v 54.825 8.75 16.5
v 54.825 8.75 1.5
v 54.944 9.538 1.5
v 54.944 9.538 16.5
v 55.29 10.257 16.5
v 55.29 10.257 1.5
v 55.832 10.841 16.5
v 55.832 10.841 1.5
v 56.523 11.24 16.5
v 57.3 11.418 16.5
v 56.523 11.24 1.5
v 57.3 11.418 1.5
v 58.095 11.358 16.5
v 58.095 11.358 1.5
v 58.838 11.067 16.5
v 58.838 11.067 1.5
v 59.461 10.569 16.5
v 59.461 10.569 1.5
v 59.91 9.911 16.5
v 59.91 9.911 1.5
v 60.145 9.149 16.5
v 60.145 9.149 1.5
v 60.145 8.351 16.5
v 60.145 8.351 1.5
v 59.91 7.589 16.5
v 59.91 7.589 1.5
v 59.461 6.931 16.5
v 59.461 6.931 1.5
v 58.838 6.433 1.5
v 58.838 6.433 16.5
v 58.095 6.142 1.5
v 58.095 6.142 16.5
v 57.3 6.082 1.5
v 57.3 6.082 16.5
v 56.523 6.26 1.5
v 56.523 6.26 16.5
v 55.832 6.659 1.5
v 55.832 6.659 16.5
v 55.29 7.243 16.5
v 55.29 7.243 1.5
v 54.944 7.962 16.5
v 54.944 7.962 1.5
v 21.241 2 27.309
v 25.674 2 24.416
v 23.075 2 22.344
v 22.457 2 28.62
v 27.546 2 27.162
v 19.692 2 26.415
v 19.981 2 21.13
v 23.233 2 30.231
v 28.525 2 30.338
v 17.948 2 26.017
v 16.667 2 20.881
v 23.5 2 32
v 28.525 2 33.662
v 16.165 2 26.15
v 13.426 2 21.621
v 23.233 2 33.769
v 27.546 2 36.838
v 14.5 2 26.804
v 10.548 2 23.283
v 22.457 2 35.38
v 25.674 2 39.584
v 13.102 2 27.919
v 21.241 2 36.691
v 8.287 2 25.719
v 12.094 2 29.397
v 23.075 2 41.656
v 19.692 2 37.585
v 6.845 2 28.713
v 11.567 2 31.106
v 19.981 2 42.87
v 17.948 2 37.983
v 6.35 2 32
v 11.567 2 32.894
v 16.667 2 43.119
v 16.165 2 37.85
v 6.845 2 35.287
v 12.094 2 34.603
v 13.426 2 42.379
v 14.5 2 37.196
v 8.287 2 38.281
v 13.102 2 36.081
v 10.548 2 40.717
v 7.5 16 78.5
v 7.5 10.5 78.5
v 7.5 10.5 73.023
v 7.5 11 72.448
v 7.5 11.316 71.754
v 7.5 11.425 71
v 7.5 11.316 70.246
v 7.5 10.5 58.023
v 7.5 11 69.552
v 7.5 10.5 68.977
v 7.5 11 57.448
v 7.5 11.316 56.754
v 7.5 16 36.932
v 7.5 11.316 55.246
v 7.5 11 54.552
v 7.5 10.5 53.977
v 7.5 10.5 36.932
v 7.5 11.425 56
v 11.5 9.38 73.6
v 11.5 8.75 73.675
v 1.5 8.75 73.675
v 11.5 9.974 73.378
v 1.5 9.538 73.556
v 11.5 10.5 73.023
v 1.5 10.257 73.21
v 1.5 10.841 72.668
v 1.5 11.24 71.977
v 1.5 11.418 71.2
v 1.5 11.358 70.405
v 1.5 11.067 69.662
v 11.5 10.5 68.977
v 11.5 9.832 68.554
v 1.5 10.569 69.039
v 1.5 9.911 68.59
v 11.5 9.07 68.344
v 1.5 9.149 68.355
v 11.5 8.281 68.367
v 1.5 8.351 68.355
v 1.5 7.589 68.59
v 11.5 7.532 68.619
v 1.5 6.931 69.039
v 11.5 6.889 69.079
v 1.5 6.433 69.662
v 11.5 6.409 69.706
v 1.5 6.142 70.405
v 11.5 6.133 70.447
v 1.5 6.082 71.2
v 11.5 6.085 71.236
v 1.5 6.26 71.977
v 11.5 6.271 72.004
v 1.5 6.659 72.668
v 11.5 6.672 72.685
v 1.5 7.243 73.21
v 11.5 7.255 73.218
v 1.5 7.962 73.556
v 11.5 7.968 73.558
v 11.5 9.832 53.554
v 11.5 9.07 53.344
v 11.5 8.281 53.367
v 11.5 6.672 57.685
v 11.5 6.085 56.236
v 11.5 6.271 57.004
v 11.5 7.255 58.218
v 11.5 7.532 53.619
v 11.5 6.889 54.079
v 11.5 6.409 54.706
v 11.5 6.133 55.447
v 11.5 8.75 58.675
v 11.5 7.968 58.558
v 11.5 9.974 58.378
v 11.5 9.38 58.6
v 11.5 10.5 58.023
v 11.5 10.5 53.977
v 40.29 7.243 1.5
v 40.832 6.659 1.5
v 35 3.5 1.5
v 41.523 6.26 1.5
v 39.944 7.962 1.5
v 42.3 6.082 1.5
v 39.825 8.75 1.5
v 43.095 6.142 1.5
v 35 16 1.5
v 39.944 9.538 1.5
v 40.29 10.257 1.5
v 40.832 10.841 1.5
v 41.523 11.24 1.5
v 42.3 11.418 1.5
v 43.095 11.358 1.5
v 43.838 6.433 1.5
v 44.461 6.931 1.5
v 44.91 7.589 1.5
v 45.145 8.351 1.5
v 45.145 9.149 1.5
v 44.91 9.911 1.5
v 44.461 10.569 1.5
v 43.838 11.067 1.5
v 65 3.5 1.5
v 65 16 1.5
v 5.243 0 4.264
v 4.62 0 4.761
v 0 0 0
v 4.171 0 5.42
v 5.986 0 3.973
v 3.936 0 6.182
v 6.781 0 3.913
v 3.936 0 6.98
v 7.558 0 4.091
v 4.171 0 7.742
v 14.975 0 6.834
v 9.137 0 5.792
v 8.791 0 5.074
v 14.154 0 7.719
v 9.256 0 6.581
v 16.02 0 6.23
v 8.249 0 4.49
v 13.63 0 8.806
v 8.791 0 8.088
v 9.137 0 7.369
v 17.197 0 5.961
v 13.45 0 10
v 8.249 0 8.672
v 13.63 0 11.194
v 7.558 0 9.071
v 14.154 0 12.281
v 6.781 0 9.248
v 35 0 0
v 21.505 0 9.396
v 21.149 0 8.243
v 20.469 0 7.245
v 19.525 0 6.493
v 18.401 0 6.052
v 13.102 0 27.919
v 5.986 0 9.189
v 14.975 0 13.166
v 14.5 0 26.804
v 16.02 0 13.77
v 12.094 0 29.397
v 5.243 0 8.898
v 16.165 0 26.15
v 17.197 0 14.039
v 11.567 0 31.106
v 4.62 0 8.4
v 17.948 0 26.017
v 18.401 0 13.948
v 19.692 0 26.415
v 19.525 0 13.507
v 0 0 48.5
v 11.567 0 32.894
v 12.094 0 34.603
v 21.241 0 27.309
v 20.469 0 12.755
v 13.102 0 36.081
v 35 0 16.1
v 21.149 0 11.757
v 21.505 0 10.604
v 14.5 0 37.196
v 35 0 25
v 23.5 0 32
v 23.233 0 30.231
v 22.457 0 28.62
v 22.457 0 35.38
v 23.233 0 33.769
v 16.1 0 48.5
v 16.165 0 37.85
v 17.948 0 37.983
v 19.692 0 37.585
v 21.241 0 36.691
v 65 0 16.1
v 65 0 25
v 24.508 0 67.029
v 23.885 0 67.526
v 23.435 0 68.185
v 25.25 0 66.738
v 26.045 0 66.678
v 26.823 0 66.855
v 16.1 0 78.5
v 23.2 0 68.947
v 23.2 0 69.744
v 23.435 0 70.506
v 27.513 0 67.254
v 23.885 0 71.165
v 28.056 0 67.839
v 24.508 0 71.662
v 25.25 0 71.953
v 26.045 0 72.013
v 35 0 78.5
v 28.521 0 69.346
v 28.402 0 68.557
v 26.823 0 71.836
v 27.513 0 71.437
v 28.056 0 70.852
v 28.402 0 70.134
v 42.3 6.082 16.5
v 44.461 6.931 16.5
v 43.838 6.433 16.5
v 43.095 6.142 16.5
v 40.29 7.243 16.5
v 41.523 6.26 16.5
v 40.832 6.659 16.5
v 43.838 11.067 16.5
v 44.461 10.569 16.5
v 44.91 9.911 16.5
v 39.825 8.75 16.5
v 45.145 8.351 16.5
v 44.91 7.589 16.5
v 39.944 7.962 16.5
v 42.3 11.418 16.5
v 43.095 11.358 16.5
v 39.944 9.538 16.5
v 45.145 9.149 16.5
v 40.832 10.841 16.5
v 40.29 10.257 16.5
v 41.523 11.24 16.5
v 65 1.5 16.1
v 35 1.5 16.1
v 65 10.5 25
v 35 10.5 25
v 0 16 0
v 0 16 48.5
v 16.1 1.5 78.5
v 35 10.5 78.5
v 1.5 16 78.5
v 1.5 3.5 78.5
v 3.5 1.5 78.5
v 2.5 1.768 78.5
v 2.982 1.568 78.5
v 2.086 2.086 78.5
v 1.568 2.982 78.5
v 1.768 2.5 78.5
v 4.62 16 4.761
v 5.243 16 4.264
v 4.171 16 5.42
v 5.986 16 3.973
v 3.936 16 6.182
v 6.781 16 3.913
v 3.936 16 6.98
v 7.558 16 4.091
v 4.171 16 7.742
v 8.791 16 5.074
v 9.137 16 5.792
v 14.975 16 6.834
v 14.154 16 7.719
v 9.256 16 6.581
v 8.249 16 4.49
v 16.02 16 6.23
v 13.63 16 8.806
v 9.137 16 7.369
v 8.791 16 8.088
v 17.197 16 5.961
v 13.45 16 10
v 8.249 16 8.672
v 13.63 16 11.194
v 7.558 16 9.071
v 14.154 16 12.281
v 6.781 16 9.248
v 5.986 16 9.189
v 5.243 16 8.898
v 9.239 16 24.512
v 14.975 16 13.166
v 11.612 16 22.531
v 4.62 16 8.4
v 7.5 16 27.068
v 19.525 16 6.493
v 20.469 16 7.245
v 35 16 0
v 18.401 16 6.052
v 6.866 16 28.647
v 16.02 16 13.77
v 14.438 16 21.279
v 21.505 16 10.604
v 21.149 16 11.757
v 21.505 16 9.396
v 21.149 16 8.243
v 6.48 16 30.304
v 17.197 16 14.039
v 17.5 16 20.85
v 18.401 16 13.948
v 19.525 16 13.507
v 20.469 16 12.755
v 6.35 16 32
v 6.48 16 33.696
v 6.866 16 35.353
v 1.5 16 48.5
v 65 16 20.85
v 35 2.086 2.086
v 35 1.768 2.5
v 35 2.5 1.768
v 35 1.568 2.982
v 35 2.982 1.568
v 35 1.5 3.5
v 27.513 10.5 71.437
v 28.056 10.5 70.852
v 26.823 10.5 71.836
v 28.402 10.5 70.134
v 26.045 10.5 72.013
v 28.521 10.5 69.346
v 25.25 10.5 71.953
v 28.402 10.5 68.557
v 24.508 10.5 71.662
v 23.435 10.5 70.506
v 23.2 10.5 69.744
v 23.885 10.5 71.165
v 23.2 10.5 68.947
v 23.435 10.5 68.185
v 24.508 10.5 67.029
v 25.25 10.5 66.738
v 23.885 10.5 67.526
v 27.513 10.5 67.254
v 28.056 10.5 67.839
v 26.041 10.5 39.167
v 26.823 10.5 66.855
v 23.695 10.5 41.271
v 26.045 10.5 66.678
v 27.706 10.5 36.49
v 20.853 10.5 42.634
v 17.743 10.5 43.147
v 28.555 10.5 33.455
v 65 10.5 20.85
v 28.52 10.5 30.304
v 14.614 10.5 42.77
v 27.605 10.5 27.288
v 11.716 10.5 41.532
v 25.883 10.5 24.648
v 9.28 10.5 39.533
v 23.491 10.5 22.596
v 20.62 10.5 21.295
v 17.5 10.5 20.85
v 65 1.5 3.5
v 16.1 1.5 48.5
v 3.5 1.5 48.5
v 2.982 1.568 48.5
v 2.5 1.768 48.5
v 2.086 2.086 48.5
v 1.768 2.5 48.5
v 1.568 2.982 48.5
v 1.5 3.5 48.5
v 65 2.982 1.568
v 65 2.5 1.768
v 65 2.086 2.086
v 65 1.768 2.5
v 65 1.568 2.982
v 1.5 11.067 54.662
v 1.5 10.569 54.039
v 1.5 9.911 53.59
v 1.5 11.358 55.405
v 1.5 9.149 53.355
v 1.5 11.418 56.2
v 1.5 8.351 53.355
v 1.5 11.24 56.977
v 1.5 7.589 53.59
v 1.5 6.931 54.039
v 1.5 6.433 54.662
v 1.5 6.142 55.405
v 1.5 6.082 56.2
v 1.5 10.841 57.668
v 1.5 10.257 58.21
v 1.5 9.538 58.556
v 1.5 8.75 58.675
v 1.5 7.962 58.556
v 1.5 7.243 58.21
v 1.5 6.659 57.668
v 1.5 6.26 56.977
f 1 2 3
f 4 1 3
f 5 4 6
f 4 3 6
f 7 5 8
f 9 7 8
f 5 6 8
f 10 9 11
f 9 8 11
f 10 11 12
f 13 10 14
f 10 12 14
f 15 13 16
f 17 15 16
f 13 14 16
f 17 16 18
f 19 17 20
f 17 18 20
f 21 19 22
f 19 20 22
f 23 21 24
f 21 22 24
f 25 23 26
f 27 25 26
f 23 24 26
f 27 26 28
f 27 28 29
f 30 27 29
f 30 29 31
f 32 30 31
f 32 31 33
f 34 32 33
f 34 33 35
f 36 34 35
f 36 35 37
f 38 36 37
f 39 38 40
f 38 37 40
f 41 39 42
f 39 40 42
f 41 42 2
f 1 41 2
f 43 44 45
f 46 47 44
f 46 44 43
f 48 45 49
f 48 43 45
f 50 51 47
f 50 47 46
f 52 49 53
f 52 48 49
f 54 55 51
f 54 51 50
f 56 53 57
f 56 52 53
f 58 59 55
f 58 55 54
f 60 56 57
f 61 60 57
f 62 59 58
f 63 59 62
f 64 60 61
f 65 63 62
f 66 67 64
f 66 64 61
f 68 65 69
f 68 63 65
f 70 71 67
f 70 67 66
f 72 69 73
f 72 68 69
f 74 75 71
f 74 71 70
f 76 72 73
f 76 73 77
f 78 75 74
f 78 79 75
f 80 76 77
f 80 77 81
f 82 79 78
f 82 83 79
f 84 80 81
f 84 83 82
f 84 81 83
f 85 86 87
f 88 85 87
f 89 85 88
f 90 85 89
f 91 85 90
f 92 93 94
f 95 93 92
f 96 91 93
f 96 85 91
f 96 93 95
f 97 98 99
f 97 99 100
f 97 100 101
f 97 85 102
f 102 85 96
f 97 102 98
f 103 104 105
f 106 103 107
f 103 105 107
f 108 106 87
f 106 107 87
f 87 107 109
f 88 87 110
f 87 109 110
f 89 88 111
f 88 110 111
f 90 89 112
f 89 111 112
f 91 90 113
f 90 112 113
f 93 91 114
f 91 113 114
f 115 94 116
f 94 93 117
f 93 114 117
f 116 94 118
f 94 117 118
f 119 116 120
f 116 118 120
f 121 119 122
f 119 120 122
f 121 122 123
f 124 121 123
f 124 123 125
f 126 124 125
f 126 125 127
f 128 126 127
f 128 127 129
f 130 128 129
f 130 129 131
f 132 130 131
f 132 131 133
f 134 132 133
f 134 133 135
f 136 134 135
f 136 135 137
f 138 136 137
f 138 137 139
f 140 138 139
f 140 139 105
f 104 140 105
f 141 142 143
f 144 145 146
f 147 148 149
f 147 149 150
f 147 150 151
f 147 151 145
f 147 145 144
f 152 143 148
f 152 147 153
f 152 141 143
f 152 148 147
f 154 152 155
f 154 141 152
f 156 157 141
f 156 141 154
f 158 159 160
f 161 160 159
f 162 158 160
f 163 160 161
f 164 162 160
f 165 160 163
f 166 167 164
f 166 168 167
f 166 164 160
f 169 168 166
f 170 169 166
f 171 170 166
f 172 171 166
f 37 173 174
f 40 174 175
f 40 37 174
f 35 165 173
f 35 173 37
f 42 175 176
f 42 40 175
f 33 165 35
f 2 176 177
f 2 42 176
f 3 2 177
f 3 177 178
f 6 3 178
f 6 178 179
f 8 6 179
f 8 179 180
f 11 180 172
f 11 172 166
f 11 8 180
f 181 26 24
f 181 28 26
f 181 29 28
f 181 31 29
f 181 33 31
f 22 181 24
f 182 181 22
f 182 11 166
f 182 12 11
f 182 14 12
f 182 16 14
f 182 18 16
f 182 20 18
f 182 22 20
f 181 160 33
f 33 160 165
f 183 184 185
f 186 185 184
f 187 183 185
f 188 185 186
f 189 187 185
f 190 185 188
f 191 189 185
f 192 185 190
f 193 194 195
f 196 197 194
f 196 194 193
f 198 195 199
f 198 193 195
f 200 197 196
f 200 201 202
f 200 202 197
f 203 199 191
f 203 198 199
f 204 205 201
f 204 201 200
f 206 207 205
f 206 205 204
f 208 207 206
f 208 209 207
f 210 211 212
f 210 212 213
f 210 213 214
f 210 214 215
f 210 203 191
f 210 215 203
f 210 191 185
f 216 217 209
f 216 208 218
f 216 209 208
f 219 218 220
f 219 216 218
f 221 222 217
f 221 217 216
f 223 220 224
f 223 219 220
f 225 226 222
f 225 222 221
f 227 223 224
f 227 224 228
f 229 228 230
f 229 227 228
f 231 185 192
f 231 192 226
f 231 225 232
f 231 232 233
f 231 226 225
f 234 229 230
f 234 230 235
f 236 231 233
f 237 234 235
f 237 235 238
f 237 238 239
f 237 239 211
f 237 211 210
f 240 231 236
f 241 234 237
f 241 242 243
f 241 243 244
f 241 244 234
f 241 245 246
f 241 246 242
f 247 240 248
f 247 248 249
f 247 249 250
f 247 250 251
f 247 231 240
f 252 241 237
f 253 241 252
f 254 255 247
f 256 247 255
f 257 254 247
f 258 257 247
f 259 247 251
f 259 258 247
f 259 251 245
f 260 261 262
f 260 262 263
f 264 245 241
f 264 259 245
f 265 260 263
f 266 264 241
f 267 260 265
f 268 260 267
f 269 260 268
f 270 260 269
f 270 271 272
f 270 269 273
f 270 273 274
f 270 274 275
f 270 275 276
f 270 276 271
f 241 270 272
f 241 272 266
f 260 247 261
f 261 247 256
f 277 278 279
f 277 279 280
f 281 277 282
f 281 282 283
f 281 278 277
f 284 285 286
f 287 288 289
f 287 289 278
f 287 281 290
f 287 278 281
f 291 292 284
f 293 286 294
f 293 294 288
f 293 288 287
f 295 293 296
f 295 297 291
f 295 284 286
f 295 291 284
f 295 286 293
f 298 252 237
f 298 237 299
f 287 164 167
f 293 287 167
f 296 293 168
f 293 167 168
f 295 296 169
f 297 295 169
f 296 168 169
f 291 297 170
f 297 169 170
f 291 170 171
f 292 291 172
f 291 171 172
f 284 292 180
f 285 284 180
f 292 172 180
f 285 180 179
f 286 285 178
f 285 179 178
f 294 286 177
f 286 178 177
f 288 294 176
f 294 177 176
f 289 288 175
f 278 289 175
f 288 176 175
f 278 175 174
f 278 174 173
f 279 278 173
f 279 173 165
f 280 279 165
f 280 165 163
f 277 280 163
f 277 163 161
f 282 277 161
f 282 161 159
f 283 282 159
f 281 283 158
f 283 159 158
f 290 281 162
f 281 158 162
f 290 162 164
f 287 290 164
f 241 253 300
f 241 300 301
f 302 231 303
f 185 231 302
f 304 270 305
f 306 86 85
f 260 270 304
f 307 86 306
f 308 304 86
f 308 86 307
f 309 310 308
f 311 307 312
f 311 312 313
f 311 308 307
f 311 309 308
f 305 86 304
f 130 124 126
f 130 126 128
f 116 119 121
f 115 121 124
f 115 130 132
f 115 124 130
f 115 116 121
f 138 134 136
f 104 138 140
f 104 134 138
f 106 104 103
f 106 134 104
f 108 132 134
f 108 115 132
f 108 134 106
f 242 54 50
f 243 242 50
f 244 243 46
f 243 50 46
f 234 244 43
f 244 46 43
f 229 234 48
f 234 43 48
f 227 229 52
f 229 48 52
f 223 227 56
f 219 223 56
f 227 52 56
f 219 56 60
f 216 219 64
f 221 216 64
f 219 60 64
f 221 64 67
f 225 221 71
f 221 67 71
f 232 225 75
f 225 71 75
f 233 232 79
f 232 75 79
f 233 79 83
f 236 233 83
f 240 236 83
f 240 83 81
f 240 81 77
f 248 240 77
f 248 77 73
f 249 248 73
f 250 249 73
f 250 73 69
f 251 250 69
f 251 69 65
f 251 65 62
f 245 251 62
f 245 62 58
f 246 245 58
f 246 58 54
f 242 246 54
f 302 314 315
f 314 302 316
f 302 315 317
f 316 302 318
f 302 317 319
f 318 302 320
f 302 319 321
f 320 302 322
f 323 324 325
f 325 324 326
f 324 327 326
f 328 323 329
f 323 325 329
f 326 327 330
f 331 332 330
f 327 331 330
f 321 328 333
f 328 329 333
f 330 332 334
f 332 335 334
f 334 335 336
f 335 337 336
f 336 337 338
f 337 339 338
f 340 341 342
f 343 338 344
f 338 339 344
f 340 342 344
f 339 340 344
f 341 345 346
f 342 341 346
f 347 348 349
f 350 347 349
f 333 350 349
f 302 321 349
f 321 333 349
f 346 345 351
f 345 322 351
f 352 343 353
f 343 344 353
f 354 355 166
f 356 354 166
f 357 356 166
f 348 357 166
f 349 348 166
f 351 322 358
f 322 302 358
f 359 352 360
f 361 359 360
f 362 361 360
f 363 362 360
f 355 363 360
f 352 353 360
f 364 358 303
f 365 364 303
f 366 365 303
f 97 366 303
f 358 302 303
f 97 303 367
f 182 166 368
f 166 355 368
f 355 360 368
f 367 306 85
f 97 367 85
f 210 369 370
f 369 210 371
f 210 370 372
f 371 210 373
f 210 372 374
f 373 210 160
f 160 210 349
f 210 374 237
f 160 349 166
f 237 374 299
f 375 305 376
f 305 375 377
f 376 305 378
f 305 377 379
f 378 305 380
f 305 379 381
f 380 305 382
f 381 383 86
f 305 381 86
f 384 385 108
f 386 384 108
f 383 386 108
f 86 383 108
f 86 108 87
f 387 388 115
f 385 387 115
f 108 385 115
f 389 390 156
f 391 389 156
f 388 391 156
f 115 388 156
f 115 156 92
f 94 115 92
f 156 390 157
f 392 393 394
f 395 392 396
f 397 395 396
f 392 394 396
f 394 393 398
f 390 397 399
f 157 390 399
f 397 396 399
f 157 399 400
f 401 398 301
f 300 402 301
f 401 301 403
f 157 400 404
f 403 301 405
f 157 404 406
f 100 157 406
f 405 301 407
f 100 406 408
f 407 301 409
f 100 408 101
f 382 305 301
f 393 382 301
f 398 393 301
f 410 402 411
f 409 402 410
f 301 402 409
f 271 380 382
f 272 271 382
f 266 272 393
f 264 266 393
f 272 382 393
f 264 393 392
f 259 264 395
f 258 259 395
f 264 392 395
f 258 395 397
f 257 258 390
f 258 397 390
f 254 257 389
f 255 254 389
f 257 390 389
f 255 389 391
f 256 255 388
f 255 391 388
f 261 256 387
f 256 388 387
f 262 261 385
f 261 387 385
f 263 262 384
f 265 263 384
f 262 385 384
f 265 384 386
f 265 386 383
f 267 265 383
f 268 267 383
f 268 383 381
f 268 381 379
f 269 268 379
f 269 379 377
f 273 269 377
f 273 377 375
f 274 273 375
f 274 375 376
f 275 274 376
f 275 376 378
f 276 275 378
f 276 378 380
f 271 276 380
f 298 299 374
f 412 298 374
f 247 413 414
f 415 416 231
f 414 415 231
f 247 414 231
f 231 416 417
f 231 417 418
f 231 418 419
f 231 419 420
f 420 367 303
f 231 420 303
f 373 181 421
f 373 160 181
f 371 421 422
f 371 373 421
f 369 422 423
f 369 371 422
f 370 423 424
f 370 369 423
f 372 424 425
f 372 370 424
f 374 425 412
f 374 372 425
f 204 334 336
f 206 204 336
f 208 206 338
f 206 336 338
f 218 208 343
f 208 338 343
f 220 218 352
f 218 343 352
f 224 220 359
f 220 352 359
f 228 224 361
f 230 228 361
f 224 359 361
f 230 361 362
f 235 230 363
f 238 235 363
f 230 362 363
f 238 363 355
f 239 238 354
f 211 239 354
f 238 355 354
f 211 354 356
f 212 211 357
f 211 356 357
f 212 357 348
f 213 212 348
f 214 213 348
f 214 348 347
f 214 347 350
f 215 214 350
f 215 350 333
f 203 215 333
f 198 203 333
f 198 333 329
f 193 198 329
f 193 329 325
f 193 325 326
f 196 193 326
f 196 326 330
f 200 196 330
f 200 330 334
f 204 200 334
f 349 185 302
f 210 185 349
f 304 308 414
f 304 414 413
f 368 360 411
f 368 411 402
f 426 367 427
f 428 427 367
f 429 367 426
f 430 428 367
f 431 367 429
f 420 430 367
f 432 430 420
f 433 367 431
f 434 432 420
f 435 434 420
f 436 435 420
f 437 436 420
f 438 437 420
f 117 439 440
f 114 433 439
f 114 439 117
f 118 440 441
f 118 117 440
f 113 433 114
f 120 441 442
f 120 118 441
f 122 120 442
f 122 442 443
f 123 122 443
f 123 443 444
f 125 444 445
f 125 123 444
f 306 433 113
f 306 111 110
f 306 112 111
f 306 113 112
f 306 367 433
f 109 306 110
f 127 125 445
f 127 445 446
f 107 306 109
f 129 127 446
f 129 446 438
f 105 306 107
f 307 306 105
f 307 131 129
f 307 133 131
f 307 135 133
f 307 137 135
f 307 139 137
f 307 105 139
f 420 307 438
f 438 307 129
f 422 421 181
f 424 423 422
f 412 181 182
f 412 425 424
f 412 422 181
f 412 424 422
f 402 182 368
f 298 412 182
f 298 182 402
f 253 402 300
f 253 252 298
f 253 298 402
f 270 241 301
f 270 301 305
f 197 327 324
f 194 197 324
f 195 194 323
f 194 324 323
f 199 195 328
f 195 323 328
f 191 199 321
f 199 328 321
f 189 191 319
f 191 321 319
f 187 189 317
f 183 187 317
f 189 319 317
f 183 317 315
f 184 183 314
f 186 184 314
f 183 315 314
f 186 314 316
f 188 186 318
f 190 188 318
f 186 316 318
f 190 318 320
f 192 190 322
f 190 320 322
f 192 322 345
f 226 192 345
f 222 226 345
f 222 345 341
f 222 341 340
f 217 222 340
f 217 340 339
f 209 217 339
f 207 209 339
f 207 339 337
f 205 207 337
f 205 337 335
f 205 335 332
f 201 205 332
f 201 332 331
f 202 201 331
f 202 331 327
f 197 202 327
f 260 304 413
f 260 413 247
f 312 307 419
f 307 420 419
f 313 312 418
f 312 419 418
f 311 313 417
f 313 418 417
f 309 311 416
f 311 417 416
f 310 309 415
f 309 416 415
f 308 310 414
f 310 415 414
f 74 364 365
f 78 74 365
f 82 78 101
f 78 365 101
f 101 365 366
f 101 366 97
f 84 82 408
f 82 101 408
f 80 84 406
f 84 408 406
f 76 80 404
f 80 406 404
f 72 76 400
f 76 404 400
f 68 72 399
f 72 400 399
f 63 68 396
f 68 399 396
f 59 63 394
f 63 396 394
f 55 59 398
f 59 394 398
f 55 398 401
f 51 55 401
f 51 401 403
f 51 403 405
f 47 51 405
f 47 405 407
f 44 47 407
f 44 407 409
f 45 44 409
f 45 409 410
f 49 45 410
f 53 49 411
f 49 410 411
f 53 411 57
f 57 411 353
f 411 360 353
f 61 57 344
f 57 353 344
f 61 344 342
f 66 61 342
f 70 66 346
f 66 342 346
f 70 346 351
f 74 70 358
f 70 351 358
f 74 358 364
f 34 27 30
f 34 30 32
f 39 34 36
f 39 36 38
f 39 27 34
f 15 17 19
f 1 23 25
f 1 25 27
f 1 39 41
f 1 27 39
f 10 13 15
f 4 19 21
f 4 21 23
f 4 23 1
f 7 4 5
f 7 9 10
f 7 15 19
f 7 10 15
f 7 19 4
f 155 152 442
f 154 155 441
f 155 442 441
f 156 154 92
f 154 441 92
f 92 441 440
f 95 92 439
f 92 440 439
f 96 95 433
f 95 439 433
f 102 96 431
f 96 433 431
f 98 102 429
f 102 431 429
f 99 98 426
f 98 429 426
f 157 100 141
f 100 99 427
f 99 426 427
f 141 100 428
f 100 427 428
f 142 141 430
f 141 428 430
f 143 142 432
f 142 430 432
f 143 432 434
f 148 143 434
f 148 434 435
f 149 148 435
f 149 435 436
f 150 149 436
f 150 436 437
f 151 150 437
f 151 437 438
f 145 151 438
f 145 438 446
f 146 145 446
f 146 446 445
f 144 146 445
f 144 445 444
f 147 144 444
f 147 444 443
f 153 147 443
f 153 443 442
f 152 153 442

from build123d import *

# Parameters (mm, degrees)
SALIENTE_EXTRUIR1_DEPTH = 16
CROQUIS6_R              = 11.15
CORTAR_EXTRUIR4_DEPTH   = 14
CROQUIS22_R             = 6
CORTAR_EXTRUIR17_DEPTH  = 3
CROQUIS8_R              = 4.05
CORTAR_EXTRUIR6_DEPTH   = 17
CORTAR_EXTRUIR12_DEPTH  = 30
CROQUIS18_R             = 2.675
CORTAR_EXTRUIR13_DEPTH  = 15
CORTAR_EXTRUIR10_DEPTH  = 30
CROQUIS16_R             = 2.675
CORTAR_EXTRUIR11_DEPTH  = 10
CROQUIS19_R             = 2.675
CORTAR_EXTRUIR14_DEPTH  = 17
CORTAR_EXTRUIR19_DEPTH  = 5.5
REDONDEO1_R             = 2


with BuildPart() as part:
    # Croquis2 → Saliente-Extruir1 (new body)
    with BuildSketch(Plane(origin=(0, 0, 0), x_dir=(-1, 0, 0), z_dir=(0, 1, 0))):
        Polygon((0, 0), (-65, 0), (-65, 25), (-35, 25), (-35, 78.5), (0, 78.5), align=None)
    extrude(amount=SALIENTE_EXTRUIR1_DEPTH)

    # Croquis6 → Cortar-Extruir4 (cut)
    with BuildSketch(Plane(origin=(0, 16, 0), x_dir=(-1, 0, 0), z_dir=(0, 1, 0))):
        with Locations((-17.5, 32)):
            Circle(CROQUIS6_R)
    extrude(amount=-CORTAR_EXTRUIR4_DEPTH, mode=Mode.SUBTRACT)

    # Croquis22 → Cortar-Extruir17 (cut, through all)
    with BuildSketch(Plane(origin=(0, 2, 0), x_dir=(1, 0, 0), z_dir=(0, 1, 0))):
        with Locations((17.5, -32)):
            Circle(CROQUIS22_R)
    extrude(amount=-CORTAR_EXTRUIR17_DEPTH, mode=Mode.SUBTRACT)

    # Croquis8 → Cortar-Extruir6 (cut, through all)
    with BuildSketch(Plane(origin=(0, 16, 0), x_dir=(-1, 0, 0), z_dir=(0, 1, 0))):
        with Locations((-17.5, 10)):
            Circle(CROQUIS8_R)
    extrude(amount=-CORTAR_EXTRUIR6_DEPTH, mode=Mode.SUBTRACT)

    # Croquis17 → Cortar-Extruir12 (cut)
    with BuildSketch(Plane(origin=(65, 0, 0), x_dir=(0, 0, -1), z_dir=(1, 0, 0))):
        Polygon((-16.1, 0), (-16.1, 1.5), (-1.5, 1.5), (-1.5, 16.1), (0, 16.1), (0, 0), align=None)
    extrude(amount=-CORTAR_EXTRUIR12_DEPTH, mode=Mode.SUBTRACT)

    # Croquis18 → Cortar-Extruir13 (cut)
    with BuildSketch(Plane(origin=(0, 0, 1.5), x_dir=(-1, 0, 0), z_dir=(0, 0, -1))):
        with Locations((-42.5, 8.75)):
            Circle(CROQUIS18_R)
        with Locations((-57.5, 8.75)):
            Circle(CROQUIS18_R)
    extrude(amount=-CORTAR_EXTRUIR13_DEPTH, mode=Mode.SUBTRACT)

    # Croquis15 → Cortar-Extruir10 (cut)
    with BuildSketch(Plane.XY.offset(78.5)):
        Polygon((0, 0), (0, 16.1), (1.5, 16.1), (1.5, 1.5), (16.1, 1.5), (16.1, 0), align=None)
    extrude(amount=-CORTAR_EXTRUIR10_DEPTH, mode=Mode.SUBTRACT)

    # Croquis16 → Cortar-Extruir11 (cut)
    with BuildSketch(Plane.ZY.offset(-1.5)):
        with Locations((56, 8.75)):
            Circle(CROQUIS16_R)
        with Locations((71, 8.75)):
            Circle(CROQUIS16_R)
    extrude(amount=-CORTAR_EXTRUIR11_DEPTH, mode=Mode.SUBTRACT)

    # Croquis19 → Cortar-Extruir14 (cut, through all)
    with BuildSketch(Plane(origin=(0, 16, 0), x_dir=(1, 0, 0), z_dir=(0, 1, 0))):
        with Locations((6.580936897, -6.580936897)):
            Circle(CROQUIS19_R)
        with Locations((25.84554815, -69.34554815)):
            Circle(CROQUIS19_R)
    extrude(amount=-CORTAR_EXTRUIR14_DEPTH, mode=Mode.SUBTRACT)

    # Croquis23 → Cortar-Extruir19 (cut)
    with BuildSketch(Plane(origin=(0, 16, 0), x_dir=(1, 0, 0), z_dir=(0, 1, 0))):
        with BuildLine():
            Line((35, -78.5), (7.5, -78.5))
            Line((7.5, -78.5), (7.5, -27.068215333))
            ThreePointArc((7.5, -27.068215333), (11.612169289, -22.531317435), (17.5, -20.85))
            Line((17.5, -20.85), (65, -20.85))
            Line((65, -20.85), (65, -25))
            Line((65, -25), (35, -25))
            Line((35, -25), (35, -78.5))
        make_face()
    extrude(amount=-CORTAR_EXTRUIR19_DEPTH, mode=Mode.SUBTRACT)

    # Redondeo1
    redondeo1_edges = [part.edges().sort_by_distance(p)[0] for p in [
        (50, 1.5, 1.5),
        (1.5, 1.5, 63.5),
    ]]
    fillet(redondeo1_edges, radius=REDONDEO1_R)


solid = part.part
